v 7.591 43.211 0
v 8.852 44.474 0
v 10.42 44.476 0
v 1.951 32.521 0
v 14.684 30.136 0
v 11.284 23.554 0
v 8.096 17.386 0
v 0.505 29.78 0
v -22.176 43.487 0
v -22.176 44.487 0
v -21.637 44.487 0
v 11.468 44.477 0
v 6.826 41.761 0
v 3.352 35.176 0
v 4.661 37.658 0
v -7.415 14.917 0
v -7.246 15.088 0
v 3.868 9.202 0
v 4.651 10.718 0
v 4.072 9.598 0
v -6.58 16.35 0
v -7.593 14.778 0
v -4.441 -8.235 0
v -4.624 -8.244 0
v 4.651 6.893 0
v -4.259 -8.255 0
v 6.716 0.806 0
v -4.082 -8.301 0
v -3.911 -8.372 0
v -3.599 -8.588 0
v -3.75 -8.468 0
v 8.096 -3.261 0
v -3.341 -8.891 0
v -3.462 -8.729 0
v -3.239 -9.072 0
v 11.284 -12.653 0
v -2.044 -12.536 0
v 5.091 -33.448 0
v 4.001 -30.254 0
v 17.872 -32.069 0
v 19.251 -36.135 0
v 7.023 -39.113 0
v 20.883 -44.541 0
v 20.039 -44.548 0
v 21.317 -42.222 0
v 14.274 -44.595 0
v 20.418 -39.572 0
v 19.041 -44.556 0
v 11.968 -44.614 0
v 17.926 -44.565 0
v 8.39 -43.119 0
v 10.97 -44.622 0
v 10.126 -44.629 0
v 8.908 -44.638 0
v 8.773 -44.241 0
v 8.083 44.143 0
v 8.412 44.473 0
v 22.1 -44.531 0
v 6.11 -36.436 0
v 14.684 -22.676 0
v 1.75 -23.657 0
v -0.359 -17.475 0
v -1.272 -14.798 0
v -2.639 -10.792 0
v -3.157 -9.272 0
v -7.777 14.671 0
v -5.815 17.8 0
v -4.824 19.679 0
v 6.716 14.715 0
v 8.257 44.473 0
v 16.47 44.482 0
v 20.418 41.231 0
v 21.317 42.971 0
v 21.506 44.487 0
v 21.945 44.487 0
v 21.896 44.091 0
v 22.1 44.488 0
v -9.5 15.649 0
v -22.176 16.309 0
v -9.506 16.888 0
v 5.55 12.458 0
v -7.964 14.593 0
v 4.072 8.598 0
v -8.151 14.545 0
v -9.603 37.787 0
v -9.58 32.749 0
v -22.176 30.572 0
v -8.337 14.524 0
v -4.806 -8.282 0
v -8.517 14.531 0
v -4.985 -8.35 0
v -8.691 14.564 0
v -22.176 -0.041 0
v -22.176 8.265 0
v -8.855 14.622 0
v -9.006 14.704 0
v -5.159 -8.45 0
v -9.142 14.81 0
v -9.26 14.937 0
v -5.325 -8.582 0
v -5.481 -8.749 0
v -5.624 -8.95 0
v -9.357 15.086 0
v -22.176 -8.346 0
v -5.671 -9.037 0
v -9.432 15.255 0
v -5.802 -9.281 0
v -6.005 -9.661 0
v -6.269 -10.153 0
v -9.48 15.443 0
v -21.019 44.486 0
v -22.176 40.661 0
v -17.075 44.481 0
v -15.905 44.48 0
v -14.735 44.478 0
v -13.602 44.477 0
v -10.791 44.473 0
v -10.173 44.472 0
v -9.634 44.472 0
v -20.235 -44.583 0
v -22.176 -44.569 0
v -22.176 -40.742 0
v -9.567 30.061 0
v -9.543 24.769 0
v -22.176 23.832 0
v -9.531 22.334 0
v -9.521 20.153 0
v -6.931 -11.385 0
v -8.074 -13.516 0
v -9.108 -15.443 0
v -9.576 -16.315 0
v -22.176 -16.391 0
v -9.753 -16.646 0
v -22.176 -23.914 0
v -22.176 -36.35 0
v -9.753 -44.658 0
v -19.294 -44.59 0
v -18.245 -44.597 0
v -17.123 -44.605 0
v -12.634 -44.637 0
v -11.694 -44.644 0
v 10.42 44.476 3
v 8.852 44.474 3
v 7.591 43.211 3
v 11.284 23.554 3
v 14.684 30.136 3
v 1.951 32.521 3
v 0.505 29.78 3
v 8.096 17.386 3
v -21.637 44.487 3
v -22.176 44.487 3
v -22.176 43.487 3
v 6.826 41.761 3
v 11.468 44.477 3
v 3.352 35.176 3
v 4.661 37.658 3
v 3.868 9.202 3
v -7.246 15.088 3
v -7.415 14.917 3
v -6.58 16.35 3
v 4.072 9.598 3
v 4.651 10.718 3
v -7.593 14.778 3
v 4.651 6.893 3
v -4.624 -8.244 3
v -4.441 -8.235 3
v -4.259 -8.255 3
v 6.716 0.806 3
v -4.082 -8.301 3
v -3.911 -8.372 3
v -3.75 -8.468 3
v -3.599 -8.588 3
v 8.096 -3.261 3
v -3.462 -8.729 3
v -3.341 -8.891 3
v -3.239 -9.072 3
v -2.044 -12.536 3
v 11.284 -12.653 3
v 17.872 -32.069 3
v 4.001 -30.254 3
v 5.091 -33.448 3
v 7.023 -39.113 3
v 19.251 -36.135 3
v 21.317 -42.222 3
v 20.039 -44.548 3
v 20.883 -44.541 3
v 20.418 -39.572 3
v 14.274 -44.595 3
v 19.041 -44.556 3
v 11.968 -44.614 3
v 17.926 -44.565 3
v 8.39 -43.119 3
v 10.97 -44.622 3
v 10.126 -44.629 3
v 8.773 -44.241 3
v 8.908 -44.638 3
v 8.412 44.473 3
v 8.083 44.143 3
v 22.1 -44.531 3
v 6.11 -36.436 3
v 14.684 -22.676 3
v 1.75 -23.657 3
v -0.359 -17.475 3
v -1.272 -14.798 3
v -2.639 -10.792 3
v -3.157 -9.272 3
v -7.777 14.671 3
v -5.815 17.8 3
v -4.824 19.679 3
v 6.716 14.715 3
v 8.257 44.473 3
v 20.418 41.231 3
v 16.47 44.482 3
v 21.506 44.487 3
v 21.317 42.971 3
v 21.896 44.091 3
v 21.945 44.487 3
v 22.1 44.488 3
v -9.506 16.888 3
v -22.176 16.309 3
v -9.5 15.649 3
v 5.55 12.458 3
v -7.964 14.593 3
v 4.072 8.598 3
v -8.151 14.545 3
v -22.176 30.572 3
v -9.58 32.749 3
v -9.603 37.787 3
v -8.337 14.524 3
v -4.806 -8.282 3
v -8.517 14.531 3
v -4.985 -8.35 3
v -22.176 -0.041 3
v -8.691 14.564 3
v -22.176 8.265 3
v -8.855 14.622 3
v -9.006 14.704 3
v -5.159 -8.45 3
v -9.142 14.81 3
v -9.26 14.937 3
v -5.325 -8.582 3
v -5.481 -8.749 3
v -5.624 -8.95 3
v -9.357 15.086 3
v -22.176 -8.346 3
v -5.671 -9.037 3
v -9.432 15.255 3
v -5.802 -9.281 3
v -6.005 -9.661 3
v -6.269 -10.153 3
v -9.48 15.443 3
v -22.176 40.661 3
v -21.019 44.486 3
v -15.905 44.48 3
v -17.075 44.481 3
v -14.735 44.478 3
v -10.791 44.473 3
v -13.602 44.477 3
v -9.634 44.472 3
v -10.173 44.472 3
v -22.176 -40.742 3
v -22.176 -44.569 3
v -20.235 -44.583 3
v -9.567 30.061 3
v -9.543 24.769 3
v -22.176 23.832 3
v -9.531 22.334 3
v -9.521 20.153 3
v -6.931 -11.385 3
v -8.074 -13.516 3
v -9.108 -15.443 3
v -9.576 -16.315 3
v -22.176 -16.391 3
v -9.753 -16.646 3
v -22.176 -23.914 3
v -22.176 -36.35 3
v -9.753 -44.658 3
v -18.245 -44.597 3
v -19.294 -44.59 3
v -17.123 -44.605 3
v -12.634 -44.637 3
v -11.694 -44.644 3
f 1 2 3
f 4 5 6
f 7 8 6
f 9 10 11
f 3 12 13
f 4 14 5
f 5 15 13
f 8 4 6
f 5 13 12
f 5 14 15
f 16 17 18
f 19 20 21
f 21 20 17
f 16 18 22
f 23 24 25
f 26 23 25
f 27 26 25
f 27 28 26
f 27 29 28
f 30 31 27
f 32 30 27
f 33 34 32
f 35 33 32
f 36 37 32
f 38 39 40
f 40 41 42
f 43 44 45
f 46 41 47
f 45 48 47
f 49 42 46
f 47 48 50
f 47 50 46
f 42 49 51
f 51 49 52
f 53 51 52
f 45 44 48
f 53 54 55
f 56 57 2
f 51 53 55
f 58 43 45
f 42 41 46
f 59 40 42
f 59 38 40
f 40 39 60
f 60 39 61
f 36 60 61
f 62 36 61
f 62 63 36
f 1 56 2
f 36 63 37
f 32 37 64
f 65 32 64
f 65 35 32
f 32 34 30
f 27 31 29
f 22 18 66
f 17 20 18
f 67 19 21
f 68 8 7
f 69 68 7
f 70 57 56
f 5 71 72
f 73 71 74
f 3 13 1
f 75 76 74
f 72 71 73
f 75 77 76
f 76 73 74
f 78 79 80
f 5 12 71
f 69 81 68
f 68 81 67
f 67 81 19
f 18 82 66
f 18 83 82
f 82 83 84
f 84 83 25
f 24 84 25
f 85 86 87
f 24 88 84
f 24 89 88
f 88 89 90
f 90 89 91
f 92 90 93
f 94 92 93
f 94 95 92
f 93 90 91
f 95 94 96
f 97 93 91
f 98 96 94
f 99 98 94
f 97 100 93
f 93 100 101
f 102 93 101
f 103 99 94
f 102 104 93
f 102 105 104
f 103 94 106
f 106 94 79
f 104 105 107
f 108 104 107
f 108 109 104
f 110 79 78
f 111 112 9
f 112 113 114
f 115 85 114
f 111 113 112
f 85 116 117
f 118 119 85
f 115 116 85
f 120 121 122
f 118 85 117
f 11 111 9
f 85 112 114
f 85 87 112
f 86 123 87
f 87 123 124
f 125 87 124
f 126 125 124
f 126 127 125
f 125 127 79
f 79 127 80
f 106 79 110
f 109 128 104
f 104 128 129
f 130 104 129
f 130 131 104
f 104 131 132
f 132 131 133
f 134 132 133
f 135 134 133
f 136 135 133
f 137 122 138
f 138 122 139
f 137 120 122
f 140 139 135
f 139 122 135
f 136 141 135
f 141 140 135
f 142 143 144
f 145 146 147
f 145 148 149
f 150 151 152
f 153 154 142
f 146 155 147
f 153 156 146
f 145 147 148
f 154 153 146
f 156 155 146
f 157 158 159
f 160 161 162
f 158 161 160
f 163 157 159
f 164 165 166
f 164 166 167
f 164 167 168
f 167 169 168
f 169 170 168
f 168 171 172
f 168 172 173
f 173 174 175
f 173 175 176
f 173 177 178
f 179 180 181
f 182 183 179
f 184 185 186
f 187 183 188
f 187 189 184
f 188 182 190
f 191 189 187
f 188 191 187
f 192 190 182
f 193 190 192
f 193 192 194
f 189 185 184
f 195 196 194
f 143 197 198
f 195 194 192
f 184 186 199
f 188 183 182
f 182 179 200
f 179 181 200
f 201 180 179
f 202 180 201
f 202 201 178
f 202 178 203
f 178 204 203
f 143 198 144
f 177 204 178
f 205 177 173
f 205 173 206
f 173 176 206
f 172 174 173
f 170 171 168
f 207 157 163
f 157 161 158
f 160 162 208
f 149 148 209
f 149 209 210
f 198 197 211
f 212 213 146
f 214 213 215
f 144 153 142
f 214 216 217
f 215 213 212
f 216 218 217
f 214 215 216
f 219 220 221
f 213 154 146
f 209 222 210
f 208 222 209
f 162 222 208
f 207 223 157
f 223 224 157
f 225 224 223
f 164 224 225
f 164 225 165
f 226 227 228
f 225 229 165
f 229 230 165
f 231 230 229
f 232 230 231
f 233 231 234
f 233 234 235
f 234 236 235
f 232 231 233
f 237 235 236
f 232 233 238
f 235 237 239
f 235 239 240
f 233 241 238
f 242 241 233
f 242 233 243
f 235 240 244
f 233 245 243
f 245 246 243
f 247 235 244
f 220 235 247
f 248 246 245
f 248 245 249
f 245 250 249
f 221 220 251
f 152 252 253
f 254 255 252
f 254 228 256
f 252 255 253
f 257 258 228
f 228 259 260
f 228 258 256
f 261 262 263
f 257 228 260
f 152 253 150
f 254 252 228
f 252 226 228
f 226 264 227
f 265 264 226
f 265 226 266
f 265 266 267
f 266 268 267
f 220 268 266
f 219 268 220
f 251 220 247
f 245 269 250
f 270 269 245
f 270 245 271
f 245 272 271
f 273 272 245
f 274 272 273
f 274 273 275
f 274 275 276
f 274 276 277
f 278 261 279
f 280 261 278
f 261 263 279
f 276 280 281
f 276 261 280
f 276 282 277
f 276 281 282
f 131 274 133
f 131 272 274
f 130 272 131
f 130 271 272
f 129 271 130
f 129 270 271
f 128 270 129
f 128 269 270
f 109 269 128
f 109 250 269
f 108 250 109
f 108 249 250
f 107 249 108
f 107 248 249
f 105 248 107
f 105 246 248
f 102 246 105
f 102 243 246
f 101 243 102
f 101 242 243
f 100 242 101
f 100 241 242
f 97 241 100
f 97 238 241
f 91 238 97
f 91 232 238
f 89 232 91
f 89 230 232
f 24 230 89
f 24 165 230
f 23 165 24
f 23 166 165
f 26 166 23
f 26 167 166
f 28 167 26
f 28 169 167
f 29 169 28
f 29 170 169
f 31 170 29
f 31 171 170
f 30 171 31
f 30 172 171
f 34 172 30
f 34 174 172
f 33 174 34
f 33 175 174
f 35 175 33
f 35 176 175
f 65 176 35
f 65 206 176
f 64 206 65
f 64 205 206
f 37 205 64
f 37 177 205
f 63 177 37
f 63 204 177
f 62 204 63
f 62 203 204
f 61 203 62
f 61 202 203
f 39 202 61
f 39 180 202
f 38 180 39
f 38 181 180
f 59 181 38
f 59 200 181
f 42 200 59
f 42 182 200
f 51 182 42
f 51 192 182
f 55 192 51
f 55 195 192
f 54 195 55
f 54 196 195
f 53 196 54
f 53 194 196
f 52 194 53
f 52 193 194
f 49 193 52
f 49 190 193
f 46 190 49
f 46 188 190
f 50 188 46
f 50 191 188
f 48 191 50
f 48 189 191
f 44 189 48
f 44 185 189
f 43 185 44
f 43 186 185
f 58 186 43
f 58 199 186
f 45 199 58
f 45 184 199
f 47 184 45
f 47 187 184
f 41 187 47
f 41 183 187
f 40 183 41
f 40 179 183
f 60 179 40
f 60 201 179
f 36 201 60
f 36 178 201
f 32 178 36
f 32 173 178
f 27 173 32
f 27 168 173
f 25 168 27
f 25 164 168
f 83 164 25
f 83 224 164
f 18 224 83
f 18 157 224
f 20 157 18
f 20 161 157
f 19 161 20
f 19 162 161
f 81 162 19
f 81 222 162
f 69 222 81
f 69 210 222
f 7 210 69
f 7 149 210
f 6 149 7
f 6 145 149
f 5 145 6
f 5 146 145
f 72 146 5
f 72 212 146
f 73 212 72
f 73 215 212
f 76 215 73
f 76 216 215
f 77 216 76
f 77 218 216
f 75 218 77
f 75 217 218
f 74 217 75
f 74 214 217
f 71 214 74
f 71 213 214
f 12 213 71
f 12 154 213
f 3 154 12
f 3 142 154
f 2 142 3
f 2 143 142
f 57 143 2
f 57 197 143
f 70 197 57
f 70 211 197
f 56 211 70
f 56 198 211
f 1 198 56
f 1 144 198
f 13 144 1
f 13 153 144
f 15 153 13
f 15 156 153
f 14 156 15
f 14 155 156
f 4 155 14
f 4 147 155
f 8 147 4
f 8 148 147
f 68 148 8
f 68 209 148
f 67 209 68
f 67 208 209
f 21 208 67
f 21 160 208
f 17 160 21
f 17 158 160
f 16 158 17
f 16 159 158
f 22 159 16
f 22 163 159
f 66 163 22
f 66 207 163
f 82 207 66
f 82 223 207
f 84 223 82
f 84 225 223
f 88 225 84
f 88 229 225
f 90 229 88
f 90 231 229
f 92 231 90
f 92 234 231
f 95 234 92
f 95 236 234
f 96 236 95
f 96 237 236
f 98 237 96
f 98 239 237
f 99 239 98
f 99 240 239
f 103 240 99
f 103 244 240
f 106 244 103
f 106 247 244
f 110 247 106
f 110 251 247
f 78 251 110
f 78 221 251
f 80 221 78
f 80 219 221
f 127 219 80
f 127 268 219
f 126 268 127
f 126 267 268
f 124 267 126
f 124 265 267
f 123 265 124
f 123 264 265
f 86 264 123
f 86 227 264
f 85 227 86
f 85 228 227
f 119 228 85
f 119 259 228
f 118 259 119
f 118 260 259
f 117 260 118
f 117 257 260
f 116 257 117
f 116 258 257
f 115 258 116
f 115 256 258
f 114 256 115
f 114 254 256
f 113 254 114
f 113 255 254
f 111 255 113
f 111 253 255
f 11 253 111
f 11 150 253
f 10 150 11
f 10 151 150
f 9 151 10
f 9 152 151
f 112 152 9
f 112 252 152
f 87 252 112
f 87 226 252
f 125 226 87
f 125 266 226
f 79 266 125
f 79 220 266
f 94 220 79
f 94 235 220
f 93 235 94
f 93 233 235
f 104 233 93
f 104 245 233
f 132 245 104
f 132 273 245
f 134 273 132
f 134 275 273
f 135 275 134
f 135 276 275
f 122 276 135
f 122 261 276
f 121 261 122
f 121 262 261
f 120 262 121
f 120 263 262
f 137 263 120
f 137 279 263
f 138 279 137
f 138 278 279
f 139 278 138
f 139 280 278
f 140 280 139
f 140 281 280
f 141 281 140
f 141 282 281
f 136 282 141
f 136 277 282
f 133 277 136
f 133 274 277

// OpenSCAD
// Generated from 交通部公路局（原交通部公路總局）「新式號牌使用之英文字、數字字體」author trace
fudge = 0.1;

module glyph_2012_K(h = 3) {
  difference() {
    linear_extrude(height = h)
      polygon(points = [[-22.1762, 44.4874], [-22.1762, 43.4873], [-22.1761, 40.6608], [-22.1761, 36.2688], [-22.1761, 30.5723], [-22.176, 23.8322], [-22.176, 16.3094], [-22.1759, 8.2647], [-22.1759, -0.0409], [-22.1758, -8.3464], [-22.1758, -16.3911], [-22.1757, -23.9139], [-22.1757, -30.654], [-22.1757, -36.3505], [-22.1756, -40.7425], [-22.1756, -43.569], [-22.1756, -44.5691], [-22.0361, -44.5701], [-21.6418, -44.5729], [-21.0292, -44.5773], [-20.2346, -44.583], [-19.2945, -44.5897], [-18.2451, -44.5973], [-17.123, -44.6053], [-15.9645, -44.6136], [-14.806, -44.6219], [-13.6838, -44.6299], [-12.6345, -44.6374], [-11.6943, -44.6441], [-10.8998, -44.6498], [-10.2871, -44.6542], [-9.8929, -44.657], [-9.7534, -44.658], [-9.7534, -44.3434], [-9.7534, -43.4544], [-9.7534, -42.0729], [-9.7534, -40.2811], [-9.7534, -38.1611], [-9.7534, -35.7948], [-9.7534, -33.2644], [-9.7534, -30.6519], [-9.7534, -28.0395], [-9.7534, -25.5091], [-9.7534, -23.1428], [-9.7534, -21.0227], [-9.7534, -19.2309], [-9.7534, -17.8495], [-9.7534, -16.9604], [-9.7534, -16.6458], [-9.707, -16.5594], [-9.5759, -16.3152], [-9.3723, -15.9357], [-9.1082, -15.4434], [-8.7957, -14.861], [-8.4469, -14.211], [-8.0739, -13.5158], [-7.6888, -12.7982], [-7.3037, -12.0805], [-6.9307, -11.3854], [-6.5819, -10.7353], [-6.2694, -10.1529], [-6.0052, -9.6607], [-5.8016, -9.2812], [-5.6706, -9.0369], [-5.6242, -8.9505], [-5.481, -8.7488], [-5.3252, -8.5823], [-5.1592, -8.4498], [-4.9854, -8.35], [-4.8061, -8.2818], [-4.6237, -8.244], [-4.4407, -8.2354], [-4.2594, -8.2547], [-4.0822, -8.3008], [-3.9114, -8.3725], [-3.7496, -8.4685], [-3.5991, -8.5878], [-3.4622, -8.7289], [-3.3413, -8.8909], [-3.239, -9.0724], [-3.1574, -9.2723], [-3.0219, -9.6694], [-2.6389, -10.7919], [-2.0439, -12.5361], [-1.2721, -14.7982], [-0.3589, -17.4749], [0.6603, -20.4624], [1.7502, -23.6571], [2.8755, -26.9554], [4.0008, -30.2537], [5.0907, -33.4484], [6.11, -36.4359], [7.0231, -39.1126], [7.7949, -41.3747], [8.39, -43.1189], [8.7729, -44.2414], [8.9084, -44.6385], [9.0566, -44.6373], [9.4753, -44.6339], [10.1258, -44.6286], [10.9697, -44.6218], [11.9681, -44.6137], [13.0824, -44.6046], [14.2741, -44.5949], [15.5044, -44.5849], [16.7347, -44.5749], [17.9264, -44.5652], [19.0407, -44.5561], [20.0391, -44.548], [20.883, -44.5412], [21.5335, -44.5359], [21.9522, -44.5325], [22.1004, -44.5313], [21.8956, -43.9278], [21.3169, -42.2224], [20.4178, -39.5725], [19.2515, -36.1355], [17.8716, -32.0688], [16.3314, -27.5298], [14.6844, -22.676], [12.984, -17.6647], [11.2836, -12.6535], [9.6366, -7.7997], [8.0964, -3.2607], [6.7165, 0.806], [5.5502, 4.2431], [4.651, 6.893], [4.0724, 8.5984], [3.8676, 9.2018], [4.0724, 9.5981], [4.651, 10.718], [5.5502, 12.4582], [6.7165, 14.7152], [8.0964, 17.3858], [9.6366, 20.3665], [11.2836, 23.5539], [12.984, 26.8447], [14.6844, 30.1356], [16.3314, 33.323], [17.8716, 36.3037], [19.2515, 38.9742], [20.4178, 41.2313], [21.3169, 42.9715], [21.8956, 44.0914], [22.1004, 44.4876], [21.9449, 44.4875], [21.5056, 44.487], [20.8228, 44.4863], [19.9374, 44.4854], [18.8897, 44.4843], [17.7203, 44.4831], [16.4698, 44.4818], [15.1787, 44.4805], [13.8877, 44.4792], [12.6372, 44.4779], [11.4678, 44.4767], [10.4201, 44.4756], [9.5346, 44.4747], [8.8519, 44.474], [8.4125, 44.4735], [8.2571, 44.4734], [8.083, 44.1433], [7.5909, 43.2107], [6.8264, 41.7615], [5.8347, 39.8818], [4.6614, 37.6578], [3.3518, 35.1756], [1.9514, 32.5211], [0.5055, 29.7805], [-0.9403, 27.04], [-2.3407, 24.3855], [-3.6503, 21.9032], [-4.8236, 19.6792], [-5.8153, 17.7996], [-6.5798, 16.3504], [-7.0719, 15.4177], [-7.246, 15.0877], [-7.4152, 14.9169], [-7.593, 14.7782], [-7.7766, 14.6706], [-7.9636, 14.5931], [-8.1511, 14.5447], [-8.3367, 14.5244], [-8.5175, 14.5312], [-8.6911, 14.5641], [-8.8548, 14.6222], [-9.0058, 14.7044], [-9.1417, 14.8098], [-9.2597, 14.9373], [-9.3572, 15.0861], [-9.4316, 15.255], [-9.4802, 15.4431], [-9.5004, 15.6494], [-9.5019, 15.9731], [-9.5061, 16.8879], [-9.5127, 18.3093], [-9.5213, 20.1529], [-9.5314, 22.3343], [-9.5426, 24.769], [-9.5547, 27.3726], [-9.5672, 30.0606], [-9.5796, 32.7486], [-9.5917, 35.3522], [-9.603, 37.7869], [-9.6131, 39.9683], [-9.6216, 41.8119], [-9.6282, 43.2333], [-9.6324, 44.1481], [-9.6339, 44.4718], [-9.7748, 44.472], [-10.1729, 44.4725], [-10.7914, 44.4732], [-11.5937, 44.4742], [-12.5429, 44.4754], [-13.6024, 44.4767], [-14.7353, 44.4782], [-15.905, 44.4796], [-17.0748, 44.4811], [-18.2077, 44.4825], [-19.2672, 44.4838], [-20.2164, 44.485], [-21.0187, 44.486], [-21.6372, 44.4867], [-22.0353, 44.4872]]);
  }
}

glyph_2012_K();
